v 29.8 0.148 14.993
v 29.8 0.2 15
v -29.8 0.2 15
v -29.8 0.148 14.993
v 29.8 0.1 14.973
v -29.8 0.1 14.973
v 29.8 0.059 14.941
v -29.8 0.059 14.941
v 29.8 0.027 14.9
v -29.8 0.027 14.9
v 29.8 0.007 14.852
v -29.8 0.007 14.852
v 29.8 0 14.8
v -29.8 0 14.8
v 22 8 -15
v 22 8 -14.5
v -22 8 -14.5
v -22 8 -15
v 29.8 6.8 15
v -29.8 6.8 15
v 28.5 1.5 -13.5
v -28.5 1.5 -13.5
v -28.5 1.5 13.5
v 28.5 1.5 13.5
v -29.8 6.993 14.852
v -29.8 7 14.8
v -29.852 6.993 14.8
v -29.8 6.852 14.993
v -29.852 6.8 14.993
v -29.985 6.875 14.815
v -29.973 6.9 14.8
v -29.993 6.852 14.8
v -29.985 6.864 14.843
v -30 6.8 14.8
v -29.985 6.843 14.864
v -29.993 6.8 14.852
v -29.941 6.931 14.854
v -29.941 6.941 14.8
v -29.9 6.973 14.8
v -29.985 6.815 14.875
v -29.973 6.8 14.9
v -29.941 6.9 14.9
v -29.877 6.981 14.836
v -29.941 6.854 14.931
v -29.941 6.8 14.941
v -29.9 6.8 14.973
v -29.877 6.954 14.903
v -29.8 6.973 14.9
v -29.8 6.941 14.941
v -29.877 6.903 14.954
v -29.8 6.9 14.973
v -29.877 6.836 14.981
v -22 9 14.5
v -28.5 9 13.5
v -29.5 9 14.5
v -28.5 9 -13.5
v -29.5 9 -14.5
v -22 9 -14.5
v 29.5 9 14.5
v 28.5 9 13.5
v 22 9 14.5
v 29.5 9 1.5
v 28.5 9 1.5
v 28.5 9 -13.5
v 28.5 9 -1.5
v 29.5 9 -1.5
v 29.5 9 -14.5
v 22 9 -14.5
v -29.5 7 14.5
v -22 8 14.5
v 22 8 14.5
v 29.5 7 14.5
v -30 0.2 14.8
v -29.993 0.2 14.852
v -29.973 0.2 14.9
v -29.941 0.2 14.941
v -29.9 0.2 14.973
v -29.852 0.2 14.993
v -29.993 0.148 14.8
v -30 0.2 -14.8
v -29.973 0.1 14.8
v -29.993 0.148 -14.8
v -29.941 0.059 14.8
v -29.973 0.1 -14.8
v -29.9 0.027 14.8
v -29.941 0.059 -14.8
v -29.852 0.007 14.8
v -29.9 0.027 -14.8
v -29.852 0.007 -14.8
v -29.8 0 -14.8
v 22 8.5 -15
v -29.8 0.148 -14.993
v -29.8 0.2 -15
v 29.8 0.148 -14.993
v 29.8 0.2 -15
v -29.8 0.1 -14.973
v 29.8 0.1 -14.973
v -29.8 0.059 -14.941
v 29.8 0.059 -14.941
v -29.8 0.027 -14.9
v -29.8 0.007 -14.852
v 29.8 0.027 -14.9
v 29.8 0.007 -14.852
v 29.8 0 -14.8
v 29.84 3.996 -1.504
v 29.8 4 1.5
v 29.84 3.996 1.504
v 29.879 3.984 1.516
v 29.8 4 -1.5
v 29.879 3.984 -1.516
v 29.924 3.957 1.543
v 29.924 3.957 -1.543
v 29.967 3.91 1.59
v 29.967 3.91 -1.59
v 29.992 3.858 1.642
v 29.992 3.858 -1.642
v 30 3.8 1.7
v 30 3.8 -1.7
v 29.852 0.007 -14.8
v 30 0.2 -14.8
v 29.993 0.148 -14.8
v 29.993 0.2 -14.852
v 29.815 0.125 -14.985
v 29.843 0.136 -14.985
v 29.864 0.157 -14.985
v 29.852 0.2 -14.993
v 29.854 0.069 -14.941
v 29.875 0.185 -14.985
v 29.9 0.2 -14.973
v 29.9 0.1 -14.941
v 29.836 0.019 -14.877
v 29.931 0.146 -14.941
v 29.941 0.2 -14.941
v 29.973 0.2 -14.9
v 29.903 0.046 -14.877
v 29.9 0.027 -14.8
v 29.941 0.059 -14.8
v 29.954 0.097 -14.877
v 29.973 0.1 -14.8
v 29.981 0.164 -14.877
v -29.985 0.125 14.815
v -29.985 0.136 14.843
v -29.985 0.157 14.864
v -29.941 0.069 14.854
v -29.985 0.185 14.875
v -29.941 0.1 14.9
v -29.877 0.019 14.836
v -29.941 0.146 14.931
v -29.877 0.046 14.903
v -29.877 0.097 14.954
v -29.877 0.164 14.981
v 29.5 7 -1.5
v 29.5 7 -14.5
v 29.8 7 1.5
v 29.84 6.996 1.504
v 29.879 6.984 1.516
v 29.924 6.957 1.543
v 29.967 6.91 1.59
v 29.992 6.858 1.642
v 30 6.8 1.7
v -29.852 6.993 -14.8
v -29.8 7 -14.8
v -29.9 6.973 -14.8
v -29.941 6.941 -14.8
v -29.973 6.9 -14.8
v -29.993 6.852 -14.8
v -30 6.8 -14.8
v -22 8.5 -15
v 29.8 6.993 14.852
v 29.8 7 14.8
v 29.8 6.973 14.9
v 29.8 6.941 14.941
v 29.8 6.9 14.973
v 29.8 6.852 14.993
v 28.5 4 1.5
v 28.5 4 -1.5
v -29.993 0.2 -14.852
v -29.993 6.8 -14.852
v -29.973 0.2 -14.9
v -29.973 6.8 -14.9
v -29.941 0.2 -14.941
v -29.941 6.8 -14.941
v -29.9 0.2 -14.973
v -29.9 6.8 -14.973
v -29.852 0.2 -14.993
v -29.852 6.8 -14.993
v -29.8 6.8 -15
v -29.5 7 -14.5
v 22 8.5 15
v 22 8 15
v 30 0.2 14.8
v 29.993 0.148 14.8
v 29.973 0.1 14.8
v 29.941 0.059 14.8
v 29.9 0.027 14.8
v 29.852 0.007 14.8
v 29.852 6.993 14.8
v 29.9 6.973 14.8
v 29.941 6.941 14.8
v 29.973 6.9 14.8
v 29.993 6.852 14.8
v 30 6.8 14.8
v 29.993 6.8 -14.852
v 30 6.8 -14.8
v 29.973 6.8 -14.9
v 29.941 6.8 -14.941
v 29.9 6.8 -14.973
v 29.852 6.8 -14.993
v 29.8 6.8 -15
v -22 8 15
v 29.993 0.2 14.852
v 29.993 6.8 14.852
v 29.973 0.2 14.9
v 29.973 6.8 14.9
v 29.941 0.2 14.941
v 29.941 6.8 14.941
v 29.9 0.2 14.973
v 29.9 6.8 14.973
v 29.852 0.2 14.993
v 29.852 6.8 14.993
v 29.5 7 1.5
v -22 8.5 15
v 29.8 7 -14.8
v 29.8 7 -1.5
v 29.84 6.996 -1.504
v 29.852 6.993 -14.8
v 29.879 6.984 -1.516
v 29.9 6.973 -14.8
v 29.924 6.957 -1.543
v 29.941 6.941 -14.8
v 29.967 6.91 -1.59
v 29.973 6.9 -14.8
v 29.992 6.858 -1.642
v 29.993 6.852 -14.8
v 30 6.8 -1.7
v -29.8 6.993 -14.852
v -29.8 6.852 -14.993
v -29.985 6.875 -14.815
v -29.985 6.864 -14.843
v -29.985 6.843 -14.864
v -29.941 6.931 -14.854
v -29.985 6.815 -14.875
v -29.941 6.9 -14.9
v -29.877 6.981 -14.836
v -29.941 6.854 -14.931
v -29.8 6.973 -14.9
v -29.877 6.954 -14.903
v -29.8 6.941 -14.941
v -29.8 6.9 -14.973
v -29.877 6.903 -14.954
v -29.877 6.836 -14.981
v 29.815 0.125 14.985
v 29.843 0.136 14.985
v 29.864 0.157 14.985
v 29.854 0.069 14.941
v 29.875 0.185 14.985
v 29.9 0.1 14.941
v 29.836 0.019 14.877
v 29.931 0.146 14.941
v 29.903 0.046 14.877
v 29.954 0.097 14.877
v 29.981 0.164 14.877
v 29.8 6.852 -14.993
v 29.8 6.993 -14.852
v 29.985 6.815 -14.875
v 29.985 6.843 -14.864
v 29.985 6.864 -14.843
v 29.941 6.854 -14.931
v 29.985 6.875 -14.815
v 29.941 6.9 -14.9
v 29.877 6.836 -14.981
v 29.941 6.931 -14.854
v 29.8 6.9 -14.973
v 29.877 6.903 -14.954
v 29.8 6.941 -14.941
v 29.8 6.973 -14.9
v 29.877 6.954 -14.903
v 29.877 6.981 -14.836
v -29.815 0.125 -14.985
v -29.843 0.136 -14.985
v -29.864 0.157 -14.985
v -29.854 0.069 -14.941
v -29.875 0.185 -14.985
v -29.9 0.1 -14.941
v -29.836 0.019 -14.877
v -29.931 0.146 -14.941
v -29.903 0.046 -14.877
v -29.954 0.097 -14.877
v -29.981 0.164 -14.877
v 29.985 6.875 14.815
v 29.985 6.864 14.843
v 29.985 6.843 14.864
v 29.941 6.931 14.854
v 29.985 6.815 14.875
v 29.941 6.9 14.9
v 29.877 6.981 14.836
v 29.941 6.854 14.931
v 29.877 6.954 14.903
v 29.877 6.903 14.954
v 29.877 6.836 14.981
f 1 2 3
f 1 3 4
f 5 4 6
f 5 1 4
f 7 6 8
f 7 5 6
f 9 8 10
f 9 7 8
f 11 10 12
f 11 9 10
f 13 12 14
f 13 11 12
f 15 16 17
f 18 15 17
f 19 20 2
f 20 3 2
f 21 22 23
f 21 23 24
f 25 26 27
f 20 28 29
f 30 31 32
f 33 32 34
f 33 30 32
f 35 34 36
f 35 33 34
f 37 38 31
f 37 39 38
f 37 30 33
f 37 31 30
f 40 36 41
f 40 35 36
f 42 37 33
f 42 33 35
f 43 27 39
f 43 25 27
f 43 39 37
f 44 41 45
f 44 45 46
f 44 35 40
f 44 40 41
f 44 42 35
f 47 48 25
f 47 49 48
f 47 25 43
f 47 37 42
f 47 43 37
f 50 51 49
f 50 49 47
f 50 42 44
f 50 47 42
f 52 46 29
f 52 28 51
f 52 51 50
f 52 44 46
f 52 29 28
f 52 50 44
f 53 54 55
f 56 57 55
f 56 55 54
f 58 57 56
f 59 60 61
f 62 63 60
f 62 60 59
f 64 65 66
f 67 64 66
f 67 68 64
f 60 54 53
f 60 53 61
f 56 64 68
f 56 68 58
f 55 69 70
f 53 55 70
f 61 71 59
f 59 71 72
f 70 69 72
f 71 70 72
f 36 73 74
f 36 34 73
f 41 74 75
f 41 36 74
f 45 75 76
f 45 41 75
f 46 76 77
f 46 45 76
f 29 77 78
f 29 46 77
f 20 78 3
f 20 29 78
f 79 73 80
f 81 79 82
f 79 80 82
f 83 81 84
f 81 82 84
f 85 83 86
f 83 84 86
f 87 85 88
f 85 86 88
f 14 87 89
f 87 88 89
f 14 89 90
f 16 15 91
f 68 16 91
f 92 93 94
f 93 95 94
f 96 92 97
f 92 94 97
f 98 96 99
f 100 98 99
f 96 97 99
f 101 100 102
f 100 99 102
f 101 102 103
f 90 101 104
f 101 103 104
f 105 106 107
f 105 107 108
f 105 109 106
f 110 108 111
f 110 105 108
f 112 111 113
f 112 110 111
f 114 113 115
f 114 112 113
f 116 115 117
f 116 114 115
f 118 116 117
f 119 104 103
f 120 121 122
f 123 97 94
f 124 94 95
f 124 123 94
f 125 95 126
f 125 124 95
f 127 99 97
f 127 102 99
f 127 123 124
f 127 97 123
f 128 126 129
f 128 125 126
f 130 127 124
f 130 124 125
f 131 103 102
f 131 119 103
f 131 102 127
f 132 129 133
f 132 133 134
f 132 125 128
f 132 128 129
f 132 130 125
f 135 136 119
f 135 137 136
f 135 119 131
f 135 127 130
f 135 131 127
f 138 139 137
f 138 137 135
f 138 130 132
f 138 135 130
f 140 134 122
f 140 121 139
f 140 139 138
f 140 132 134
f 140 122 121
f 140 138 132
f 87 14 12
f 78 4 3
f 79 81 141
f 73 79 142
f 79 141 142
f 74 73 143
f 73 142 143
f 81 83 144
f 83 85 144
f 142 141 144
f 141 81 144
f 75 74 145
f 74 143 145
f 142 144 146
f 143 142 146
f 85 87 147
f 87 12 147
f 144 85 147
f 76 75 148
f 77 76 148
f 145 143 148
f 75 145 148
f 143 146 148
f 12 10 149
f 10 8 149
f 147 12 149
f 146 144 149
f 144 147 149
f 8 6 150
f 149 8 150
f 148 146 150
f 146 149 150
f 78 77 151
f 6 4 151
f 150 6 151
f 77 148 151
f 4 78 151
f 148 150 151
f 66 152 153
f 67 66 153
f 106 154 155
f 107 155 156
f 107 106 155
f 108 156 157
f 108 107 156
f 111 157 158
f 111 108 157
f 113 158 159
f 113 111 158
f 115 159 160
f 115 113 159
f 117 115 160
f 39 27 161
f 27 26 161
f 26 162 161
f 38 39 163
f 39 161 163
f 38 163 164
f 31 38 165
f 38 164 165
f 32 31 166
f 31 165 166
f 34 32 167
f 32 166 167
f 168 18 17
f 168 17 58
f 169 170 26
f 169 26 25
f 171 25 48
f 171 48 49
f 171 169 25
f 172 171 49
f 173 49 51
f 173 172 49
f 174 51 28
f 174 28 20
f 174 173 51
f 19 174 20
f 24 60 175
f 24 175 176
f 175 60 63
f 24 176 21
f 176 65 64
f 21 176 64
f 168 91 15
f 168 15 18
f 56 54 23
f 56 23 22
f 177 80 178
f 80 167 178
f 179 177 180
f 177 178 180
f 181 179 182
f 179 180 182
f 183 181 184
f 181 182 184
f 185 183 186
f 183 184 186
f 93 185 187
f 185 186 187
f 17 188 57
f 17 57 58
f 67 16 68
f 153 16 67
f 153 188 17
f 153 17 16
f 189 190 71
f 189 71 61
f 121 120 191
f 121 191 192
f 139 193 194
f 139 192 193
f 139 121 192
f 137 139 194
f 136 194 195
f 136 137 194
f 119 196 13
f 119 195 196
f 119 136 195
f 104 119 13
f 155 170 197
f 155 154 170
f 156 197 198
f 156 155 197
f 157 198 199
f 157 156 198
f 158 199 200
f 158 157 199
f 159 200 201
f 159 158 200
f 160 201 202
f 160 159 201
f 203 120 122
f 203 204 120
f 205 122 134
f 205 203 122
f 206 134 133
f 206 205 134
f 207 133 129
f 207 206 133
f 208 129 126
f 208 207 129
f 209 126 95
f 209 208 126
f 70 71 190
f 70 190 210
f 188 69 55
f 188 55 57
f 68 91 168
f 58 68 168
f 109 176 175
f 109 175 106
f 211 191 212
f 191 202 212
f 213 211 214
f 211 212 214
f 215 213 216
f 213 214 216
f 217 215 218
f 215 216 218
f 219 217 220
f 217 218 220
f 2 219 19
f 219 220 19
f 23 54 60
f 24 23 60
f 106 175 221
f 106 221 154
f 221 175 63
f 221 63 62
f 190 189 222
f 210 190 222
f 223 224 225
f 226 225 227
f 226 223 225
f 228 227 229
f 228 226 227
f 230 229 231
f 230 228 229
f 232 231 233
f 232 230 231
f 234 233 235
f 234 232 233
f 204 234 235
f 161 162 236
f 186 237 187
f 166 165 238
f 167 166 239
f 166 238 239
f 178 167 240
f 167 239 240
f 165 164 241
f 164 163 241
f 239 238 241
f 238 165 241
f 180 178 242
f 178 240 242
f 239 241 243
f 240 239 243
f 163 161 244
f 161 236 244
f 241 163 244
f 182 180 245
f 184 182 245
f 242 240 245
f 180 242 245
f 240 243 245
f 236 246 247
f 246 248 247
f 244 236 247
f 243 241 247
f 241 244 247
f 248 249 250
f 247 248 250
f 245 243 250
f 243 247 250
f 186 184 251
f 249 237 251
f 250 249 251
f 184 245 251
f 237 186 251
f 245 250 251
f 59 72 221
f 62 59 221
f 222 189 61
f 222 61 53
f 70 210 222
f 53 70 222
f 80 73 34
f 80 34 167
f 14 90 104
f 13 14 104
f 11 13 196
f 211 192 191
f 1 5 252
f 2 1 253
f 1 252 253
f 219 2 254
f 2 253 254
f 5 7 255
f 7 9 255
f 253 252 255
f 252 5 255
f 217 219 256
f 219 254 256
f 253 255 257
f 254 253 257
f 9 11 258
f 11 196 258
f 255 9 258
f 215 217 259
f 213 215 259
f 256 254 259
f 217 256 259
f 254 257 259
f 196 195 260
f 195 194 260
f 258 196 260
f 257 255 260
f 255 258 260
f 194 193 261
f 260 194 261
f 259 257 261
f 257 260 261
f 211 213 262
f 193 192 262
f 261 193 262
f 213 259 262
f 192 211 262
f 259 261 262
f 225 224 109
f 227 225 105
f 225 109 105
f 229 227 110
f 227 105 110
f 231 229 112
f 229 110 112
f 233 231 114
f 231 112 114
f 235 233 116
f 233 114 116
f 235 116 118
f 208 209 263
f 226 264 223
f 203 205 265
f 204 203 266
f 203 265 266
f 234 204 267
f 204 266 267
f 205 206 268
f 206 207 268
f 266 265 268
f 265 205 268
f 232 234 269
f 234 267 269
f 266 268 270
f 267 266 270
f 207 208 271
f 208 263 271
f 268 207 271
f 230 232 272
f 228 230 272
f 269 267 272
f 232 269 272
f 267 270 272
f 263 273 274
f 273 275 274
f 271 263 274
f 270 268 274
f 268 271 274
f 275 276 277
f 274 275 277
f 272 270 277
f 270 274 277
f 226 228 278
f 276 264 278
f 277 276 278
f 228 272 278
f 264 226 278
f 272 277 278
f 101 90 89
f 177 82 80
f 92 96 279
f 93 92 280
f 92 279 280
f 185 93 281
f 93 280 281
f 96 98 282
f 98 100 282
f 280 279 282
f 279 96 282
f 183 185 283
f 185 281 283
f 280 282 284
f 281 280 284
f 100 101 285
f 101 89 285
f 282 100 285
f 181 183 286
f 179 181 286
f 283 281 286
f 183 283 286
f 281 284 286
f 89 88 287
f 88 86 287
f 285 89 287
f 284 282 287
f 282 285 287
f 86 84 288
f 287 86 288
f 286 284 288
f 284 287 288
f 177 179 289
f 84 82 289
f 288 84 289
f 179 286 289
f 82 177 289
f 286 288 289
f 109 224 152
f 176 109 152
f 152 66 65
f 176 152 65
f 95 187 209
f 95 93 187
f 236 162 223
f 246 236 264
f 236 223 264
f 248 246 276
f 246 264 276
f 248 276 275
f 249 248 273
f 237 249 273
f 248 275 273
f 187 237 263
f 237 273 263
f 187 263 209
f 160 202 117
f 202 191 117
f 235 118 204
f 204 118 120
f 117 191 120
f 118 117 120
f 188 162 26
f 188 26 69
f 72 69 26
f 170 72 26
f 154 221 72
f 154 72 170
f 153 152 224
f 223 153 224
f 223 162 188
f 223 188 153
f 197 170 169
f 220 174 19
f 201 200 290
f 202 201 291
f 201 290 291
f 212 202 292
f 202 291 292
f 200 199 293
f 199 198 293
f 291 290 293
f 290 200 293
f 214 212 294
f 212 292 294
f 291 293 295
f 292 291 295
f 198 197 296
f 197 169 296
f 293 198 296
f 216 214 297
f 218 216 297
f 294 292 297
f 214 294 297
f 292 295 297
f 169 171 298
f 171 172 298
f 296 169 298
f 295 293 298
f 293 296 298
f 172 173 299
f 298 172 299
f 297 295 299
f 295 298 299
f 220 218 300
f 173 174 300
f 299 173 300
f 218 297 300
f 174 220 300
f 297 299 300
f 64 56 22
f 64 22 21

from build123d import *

# Parameters (mm, degrees)
SKETCH_1_W                 = 60
SKETCH_1_H                 = 30
EXTRUDE_1_DEPTH            = 7
SKETCH_2_W                 = 59
SKETCH_2_H                 = 29
EXTRUDE_2_DEPTH            = 2
SKETCH_3_W                 = 57
SKETCH_3_H                 = 27
CUT_EXTRUDE_1_DEPTH        = 7.5
SKETCH_4_W                 = 44
SKETCH_4_H                 = 1
EXTRUDE_3_DEPTH            = 0.5
CHAMFER_1_SIZE             = 0.5
CHAMFER_1_OF_MIRROR_1_SIZE = 0.5
CUT_EXTRUDE_2_DEPTH        = 5
FILLET_1_R                 = 0.2


with BuildPart() as part:
    # 草图1 → 凸台-拉伸1 (new body)
    with BuildSketch(Plane(origin=(0, 0, 0), x_dir=(1, 0, 0), z_dir=(0, 1, 0))):
        Rectangle(SKETCH_1_W, SKETCH_1_H)
    extrude(amount=EXTRUDE_1_DEPTH)

    # 草图2 → 凸台-拉伸2 (add)
    with BuildSketch(Plane(origin=(0, 7, 0), x_dir=(1, 0, 0), z_dir=(0, 1, 0))):
        Rectangle(SKETCH_2_W, SKETCH_2_H)
    extrude(amount=EXTRUDE_2_DEPTH)

    # 草图3 → 切除-拉伸1 (cut)
    with BuildSketch(Plane(origin=(0, 9, 0), x_dir=(1, 0, 0), z_dir=(0, 1, 0))):
        Rectangle(SKETCH_3_W, SKETCH_3_H)
    extrude(amount=-CUT_EXTRUDE_1_DEPTH, mode=Mode.SUBTRACT)

    # 草图4 → 凸台-拉伸3 (add)
    with BuildSketch(Plane(origin=(0, 0, -14.5), x_dir=(-1, 0, 0), z_dir=(0, 0, -1))):
        with Locations((0, 8.5)):
            Rectangle(SKETCH_4_W, SKETCH_4_H)
    extrude_3 = extrude(amount=EXTRUDE_3_DEPTH)

    # 倒角1
    chamfer_1_edges = [part.edges().sort_by_distance(p)[0] for p in [
        (0, 9, -15),
    ]]
    chamfer(chamfer_1_edges, length=CHAMFER_1_SIZE)

    # 镜向1: 凸台-拉伸3 across plane
    add(extrude_3.mirror(Plane.XY))

    # 倒角1 of 镜向1
    chamfer_1_of_mirror_1_edges = [part.edges().sort_by_distance(p)[0] for p in [
        (0, 9, 15),
    ]]
    chamfer(chamfer_1_of_mirror_1_edges, length=CHAMFER_1_OF_MIRROR_1_SIZE)

    # 草图5 → 切除-拉伸2 (cut)
    with BuildSketch(Plane(origin=(0, 9, 0), x_dir=(1, 0, 0), z_dir=(0, 1, 0))):
        Polygon((30, 0), (30, 1.5), (28.5, 1.5), (28.5, -1.5), (30, -1.5), align=None)
    extrude(amount=-CUT_EXTRUDE_2_DEPTH, mode=Mode.SUBTRACT)

    # 圆角1
    fillet_1_edges = [part.edges().sort_by_distance(p)[0] for p in [
        (0, 7, 15),
        (30, 7, 8.25),
        (0, 7, -15),
        (30, 0, 0),
        (0, 0, 15),
        (-30, 0, 0),
        (0, 0, -15),
        (-30, 7, 0),
        (30, 3.5, -15),
        (30, 3.5, 15),
        (-30, 3.5, 15),
        (-30, 3.5, -15),
        (30, 7, -8.25),
        (30, 5.5, 1.5),
        (30, 4, 0),
        (30, 5.5, -1.5),
    ]]
    fillet(fillet_1_edges, radius=FILLET_1_R)


solid = part.part
